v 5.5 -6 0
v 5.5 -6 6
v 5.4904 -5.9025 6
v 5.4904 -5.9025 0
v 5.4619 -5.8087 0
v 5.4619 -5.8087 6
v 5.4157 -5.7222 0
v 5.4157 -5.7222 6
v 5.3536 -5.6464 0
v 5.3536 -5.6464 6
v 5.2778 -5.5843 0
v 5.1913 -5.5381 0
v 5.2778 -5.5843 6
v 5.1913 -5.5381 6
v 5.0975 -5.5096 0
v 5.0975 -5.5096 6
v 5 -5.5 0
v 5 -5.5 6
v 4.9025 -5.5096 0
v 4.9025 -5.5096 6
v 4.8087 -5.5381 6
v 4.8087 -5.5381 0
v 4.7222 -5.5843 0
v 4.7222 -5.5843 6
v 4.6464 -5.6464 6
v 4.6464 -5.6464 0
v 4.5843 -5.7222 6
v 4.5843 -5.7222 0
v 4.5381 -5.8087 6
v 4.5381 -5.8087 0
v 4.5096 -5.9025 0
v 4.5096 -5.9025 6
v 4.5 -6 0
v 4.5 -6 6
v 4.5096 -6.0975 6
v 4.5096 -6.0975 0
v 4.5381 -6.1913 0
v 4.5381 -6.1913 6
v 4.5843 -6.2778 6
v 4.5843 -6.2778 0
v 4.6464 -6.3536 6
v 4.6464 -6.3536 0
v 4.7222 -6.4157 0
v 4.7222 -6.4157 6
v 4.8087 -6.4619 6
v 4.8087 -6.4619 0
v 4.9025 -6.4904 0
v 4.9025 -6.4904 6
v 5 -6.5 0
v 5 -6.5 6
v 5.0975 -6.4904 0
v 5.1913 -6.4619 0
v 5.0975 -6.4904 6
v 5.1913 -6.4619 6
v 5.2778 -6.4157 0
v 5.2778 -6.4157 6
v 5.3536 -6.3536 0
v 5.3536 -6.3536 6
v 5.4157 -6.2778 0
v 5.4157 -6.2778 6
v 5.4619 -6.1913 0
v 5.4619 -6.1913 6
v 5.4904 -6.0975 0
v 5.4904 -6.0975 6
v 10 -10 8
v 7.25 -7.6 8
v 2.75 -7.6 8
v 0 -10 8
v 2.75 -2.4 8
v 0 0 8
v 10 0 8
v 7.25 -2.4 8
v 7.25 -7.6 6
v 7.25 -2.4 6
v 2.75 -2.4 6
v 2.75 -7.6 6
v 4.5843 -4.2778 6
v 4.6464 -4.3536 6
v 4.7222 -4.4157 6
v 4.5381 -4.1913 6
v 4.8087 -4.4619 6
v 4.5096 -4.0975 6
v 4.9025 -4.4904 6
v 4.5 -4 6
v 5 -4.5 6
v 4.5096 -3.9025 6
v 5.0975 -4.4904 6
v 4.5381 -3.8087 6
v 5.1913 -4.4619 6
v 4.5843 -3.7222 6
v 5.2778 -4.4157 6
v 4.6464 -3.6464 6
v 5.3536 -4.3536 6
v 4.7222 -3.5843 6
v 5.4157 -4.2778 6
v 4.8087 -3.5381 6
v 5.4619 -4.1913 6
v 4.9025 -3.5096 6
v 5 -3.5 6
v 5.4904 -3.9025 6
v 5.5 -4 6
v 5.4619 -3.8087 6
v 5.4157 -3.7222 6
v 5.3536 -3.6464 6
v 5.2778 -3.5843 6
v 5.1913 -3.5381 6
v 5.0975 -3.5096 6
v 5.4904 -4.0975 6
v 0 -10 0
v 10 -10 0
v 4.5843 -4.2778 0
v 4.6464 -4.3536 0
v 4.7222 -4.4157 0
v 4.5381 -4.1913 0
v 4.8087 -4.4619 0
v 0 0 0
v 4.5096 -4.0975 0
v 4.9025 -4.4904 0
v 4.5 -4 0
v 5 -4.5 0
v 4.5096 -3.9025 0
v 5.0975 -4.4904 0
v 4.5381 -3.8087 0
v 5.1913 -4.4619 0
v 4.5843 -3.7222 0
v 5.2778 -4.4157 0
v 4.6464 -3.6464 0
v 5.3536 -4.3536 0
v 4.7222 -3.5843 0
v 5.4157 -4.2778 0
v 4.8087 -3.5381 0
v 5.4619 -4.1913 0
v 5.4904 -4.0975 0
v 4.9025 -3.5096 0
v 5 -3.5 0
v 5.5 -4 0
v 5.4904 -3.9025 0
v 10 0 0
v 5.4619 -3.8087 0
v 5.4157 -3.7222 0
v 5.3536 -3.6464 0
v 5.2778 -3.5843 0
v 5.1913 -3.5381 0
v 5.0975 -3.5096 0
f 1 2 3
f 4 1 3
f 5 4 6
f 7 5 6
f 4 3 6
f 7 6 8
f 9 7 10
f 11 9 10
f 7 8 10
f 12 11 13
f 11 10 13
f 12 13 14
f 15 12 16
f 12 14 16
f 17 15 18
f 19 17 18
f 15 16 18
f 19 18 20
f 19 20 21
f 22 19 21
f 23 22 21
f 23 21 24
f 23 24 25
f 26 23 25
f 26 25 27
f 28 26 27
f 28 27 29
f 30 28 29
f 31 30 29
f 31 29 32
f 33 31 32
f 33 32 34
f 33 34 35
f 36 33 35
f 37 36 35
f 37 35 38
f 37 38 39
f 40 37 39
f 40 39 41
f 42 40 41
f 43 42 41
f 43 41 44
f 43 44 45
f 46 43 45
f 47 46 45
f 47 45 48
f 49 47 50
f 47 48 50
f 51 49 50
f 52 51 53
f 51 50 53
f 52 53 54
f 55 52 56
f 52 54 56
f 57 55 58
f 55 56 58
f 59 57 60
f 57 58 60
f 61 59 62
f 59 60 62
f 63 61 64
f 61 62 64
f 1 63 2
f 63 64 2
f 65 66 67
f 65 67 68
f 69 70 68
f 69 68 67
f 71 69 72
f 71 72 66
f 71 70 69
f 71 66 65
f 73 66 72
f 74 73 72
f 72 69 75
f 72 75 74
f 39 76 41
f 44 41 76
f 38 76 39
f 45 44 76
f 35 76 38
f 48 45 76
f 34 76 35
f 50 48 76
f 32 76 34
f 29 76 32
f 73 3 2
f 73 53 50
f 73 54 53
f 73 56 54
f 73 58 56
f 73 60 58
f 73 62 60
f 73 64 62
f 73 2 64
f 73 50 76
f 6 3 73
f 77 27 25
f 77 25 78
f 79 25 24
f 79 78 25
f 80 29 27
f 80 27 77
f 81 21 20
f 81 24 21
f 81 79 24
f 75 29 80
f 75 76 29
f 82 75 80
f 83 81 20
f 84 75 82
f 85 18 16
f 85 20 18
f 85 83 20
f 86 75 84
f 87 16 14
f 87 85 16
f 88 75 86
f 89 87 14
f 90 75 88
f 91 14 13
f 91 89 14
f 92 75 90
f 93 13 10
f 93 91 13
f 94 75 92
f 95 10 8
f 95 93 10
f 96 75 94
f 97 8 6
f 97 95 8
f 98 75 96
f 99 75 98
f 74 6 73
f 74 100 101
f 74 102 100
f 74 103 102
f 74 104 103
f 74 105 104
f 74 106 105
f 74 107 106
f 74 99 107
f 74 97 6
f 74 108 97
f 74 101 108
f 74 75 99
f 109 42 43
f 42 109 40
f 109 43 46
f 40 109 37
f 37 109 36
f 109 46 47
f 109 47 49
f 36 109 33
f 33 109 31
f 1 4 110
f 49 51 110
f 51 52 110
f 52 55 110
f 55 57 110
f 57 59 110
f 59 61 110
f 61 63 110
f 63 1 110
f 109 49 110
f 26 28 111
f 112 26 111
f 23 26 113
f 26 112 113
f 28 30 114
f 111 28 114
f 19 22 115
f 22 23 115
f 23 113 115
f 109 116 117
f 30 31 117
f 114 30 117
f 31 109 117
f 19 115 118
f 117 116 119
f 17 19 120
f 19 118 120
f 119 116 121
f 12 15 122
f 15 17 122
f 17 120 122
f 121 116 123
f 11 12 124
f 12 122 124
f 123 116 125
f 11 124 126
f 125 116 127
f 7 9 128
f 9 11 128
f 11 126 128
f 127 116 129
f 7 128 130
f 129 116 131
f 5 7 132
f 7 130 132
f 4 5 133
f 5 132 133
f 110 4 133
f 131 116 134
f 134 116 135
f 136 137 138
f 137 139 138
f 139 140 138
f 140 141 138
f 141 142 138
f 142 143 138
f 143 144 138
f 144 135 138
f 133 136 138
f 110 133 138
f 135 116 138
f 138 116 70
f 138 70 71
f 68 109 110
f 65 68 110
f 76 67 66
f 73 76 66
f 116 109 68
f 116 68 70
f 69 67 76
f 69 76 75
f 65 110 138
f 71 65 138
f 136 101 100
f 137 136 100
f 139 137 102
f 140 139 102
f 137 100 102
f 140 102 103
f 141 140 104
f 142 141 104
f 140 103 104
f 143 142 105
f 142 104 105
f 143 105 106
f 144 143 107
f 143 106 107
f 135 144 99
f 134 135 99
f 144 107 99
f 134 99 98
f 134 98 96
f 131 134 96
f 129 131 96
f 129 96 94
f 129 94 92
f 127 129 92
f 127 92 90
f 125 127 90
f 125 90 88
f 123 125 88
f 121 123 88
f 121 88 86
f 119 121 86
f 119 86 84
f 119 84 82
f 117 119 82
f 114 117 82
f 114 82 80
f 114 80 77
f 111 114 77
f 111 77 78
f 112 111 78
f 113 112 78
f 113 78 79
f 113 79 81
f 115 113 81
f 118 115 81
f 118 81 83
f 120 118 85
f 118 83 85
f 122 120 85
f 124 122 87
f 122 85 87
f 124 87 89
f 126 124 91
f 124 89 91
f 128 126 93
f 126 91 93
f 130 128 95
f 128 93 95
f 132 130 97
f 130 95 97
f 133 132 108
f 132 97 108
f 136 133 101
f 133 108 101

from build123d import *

# Parameters (mm, degrees)
F0_W     = 10
F0_H     = 10
F1_DEPTH = 8
F2_W     = 4.5
F2_H     = 5.2
F3_DEPTH = 2
F4_R     = 0.5
F5_DEPTH = 25


with BuildPart() as f1:
    # F0 (on Top) → F1 (new body)
    with BuildSketch(Plane.XY):
        with Locations((5, -5)):
            Rectangle(F0_W, F0_H)
    extrude(amount=F1_DEPTH)

    # F2 (on face) → F3 (cut)
    with BuildSketch(Plane.XY.offset(8)):
        with Locations((5, -5)):
            Rectangle(F2_W, F2_H)
    extrude(amount=-F3_DEPTH, mode=Mode.SUBTRACT)

    # F4 (on face) → F5 (cut)
    with BuildSketch(Plane.XY.offset(6)):
        with Locations((5, -4)):
            Circle(F4_R)
        with Locations((5, -6)):
            Circle(F4_R)
    extrude(amount=-F5_DEPTH, mode=Mode.SUBTRACT)


solid = f1.part
